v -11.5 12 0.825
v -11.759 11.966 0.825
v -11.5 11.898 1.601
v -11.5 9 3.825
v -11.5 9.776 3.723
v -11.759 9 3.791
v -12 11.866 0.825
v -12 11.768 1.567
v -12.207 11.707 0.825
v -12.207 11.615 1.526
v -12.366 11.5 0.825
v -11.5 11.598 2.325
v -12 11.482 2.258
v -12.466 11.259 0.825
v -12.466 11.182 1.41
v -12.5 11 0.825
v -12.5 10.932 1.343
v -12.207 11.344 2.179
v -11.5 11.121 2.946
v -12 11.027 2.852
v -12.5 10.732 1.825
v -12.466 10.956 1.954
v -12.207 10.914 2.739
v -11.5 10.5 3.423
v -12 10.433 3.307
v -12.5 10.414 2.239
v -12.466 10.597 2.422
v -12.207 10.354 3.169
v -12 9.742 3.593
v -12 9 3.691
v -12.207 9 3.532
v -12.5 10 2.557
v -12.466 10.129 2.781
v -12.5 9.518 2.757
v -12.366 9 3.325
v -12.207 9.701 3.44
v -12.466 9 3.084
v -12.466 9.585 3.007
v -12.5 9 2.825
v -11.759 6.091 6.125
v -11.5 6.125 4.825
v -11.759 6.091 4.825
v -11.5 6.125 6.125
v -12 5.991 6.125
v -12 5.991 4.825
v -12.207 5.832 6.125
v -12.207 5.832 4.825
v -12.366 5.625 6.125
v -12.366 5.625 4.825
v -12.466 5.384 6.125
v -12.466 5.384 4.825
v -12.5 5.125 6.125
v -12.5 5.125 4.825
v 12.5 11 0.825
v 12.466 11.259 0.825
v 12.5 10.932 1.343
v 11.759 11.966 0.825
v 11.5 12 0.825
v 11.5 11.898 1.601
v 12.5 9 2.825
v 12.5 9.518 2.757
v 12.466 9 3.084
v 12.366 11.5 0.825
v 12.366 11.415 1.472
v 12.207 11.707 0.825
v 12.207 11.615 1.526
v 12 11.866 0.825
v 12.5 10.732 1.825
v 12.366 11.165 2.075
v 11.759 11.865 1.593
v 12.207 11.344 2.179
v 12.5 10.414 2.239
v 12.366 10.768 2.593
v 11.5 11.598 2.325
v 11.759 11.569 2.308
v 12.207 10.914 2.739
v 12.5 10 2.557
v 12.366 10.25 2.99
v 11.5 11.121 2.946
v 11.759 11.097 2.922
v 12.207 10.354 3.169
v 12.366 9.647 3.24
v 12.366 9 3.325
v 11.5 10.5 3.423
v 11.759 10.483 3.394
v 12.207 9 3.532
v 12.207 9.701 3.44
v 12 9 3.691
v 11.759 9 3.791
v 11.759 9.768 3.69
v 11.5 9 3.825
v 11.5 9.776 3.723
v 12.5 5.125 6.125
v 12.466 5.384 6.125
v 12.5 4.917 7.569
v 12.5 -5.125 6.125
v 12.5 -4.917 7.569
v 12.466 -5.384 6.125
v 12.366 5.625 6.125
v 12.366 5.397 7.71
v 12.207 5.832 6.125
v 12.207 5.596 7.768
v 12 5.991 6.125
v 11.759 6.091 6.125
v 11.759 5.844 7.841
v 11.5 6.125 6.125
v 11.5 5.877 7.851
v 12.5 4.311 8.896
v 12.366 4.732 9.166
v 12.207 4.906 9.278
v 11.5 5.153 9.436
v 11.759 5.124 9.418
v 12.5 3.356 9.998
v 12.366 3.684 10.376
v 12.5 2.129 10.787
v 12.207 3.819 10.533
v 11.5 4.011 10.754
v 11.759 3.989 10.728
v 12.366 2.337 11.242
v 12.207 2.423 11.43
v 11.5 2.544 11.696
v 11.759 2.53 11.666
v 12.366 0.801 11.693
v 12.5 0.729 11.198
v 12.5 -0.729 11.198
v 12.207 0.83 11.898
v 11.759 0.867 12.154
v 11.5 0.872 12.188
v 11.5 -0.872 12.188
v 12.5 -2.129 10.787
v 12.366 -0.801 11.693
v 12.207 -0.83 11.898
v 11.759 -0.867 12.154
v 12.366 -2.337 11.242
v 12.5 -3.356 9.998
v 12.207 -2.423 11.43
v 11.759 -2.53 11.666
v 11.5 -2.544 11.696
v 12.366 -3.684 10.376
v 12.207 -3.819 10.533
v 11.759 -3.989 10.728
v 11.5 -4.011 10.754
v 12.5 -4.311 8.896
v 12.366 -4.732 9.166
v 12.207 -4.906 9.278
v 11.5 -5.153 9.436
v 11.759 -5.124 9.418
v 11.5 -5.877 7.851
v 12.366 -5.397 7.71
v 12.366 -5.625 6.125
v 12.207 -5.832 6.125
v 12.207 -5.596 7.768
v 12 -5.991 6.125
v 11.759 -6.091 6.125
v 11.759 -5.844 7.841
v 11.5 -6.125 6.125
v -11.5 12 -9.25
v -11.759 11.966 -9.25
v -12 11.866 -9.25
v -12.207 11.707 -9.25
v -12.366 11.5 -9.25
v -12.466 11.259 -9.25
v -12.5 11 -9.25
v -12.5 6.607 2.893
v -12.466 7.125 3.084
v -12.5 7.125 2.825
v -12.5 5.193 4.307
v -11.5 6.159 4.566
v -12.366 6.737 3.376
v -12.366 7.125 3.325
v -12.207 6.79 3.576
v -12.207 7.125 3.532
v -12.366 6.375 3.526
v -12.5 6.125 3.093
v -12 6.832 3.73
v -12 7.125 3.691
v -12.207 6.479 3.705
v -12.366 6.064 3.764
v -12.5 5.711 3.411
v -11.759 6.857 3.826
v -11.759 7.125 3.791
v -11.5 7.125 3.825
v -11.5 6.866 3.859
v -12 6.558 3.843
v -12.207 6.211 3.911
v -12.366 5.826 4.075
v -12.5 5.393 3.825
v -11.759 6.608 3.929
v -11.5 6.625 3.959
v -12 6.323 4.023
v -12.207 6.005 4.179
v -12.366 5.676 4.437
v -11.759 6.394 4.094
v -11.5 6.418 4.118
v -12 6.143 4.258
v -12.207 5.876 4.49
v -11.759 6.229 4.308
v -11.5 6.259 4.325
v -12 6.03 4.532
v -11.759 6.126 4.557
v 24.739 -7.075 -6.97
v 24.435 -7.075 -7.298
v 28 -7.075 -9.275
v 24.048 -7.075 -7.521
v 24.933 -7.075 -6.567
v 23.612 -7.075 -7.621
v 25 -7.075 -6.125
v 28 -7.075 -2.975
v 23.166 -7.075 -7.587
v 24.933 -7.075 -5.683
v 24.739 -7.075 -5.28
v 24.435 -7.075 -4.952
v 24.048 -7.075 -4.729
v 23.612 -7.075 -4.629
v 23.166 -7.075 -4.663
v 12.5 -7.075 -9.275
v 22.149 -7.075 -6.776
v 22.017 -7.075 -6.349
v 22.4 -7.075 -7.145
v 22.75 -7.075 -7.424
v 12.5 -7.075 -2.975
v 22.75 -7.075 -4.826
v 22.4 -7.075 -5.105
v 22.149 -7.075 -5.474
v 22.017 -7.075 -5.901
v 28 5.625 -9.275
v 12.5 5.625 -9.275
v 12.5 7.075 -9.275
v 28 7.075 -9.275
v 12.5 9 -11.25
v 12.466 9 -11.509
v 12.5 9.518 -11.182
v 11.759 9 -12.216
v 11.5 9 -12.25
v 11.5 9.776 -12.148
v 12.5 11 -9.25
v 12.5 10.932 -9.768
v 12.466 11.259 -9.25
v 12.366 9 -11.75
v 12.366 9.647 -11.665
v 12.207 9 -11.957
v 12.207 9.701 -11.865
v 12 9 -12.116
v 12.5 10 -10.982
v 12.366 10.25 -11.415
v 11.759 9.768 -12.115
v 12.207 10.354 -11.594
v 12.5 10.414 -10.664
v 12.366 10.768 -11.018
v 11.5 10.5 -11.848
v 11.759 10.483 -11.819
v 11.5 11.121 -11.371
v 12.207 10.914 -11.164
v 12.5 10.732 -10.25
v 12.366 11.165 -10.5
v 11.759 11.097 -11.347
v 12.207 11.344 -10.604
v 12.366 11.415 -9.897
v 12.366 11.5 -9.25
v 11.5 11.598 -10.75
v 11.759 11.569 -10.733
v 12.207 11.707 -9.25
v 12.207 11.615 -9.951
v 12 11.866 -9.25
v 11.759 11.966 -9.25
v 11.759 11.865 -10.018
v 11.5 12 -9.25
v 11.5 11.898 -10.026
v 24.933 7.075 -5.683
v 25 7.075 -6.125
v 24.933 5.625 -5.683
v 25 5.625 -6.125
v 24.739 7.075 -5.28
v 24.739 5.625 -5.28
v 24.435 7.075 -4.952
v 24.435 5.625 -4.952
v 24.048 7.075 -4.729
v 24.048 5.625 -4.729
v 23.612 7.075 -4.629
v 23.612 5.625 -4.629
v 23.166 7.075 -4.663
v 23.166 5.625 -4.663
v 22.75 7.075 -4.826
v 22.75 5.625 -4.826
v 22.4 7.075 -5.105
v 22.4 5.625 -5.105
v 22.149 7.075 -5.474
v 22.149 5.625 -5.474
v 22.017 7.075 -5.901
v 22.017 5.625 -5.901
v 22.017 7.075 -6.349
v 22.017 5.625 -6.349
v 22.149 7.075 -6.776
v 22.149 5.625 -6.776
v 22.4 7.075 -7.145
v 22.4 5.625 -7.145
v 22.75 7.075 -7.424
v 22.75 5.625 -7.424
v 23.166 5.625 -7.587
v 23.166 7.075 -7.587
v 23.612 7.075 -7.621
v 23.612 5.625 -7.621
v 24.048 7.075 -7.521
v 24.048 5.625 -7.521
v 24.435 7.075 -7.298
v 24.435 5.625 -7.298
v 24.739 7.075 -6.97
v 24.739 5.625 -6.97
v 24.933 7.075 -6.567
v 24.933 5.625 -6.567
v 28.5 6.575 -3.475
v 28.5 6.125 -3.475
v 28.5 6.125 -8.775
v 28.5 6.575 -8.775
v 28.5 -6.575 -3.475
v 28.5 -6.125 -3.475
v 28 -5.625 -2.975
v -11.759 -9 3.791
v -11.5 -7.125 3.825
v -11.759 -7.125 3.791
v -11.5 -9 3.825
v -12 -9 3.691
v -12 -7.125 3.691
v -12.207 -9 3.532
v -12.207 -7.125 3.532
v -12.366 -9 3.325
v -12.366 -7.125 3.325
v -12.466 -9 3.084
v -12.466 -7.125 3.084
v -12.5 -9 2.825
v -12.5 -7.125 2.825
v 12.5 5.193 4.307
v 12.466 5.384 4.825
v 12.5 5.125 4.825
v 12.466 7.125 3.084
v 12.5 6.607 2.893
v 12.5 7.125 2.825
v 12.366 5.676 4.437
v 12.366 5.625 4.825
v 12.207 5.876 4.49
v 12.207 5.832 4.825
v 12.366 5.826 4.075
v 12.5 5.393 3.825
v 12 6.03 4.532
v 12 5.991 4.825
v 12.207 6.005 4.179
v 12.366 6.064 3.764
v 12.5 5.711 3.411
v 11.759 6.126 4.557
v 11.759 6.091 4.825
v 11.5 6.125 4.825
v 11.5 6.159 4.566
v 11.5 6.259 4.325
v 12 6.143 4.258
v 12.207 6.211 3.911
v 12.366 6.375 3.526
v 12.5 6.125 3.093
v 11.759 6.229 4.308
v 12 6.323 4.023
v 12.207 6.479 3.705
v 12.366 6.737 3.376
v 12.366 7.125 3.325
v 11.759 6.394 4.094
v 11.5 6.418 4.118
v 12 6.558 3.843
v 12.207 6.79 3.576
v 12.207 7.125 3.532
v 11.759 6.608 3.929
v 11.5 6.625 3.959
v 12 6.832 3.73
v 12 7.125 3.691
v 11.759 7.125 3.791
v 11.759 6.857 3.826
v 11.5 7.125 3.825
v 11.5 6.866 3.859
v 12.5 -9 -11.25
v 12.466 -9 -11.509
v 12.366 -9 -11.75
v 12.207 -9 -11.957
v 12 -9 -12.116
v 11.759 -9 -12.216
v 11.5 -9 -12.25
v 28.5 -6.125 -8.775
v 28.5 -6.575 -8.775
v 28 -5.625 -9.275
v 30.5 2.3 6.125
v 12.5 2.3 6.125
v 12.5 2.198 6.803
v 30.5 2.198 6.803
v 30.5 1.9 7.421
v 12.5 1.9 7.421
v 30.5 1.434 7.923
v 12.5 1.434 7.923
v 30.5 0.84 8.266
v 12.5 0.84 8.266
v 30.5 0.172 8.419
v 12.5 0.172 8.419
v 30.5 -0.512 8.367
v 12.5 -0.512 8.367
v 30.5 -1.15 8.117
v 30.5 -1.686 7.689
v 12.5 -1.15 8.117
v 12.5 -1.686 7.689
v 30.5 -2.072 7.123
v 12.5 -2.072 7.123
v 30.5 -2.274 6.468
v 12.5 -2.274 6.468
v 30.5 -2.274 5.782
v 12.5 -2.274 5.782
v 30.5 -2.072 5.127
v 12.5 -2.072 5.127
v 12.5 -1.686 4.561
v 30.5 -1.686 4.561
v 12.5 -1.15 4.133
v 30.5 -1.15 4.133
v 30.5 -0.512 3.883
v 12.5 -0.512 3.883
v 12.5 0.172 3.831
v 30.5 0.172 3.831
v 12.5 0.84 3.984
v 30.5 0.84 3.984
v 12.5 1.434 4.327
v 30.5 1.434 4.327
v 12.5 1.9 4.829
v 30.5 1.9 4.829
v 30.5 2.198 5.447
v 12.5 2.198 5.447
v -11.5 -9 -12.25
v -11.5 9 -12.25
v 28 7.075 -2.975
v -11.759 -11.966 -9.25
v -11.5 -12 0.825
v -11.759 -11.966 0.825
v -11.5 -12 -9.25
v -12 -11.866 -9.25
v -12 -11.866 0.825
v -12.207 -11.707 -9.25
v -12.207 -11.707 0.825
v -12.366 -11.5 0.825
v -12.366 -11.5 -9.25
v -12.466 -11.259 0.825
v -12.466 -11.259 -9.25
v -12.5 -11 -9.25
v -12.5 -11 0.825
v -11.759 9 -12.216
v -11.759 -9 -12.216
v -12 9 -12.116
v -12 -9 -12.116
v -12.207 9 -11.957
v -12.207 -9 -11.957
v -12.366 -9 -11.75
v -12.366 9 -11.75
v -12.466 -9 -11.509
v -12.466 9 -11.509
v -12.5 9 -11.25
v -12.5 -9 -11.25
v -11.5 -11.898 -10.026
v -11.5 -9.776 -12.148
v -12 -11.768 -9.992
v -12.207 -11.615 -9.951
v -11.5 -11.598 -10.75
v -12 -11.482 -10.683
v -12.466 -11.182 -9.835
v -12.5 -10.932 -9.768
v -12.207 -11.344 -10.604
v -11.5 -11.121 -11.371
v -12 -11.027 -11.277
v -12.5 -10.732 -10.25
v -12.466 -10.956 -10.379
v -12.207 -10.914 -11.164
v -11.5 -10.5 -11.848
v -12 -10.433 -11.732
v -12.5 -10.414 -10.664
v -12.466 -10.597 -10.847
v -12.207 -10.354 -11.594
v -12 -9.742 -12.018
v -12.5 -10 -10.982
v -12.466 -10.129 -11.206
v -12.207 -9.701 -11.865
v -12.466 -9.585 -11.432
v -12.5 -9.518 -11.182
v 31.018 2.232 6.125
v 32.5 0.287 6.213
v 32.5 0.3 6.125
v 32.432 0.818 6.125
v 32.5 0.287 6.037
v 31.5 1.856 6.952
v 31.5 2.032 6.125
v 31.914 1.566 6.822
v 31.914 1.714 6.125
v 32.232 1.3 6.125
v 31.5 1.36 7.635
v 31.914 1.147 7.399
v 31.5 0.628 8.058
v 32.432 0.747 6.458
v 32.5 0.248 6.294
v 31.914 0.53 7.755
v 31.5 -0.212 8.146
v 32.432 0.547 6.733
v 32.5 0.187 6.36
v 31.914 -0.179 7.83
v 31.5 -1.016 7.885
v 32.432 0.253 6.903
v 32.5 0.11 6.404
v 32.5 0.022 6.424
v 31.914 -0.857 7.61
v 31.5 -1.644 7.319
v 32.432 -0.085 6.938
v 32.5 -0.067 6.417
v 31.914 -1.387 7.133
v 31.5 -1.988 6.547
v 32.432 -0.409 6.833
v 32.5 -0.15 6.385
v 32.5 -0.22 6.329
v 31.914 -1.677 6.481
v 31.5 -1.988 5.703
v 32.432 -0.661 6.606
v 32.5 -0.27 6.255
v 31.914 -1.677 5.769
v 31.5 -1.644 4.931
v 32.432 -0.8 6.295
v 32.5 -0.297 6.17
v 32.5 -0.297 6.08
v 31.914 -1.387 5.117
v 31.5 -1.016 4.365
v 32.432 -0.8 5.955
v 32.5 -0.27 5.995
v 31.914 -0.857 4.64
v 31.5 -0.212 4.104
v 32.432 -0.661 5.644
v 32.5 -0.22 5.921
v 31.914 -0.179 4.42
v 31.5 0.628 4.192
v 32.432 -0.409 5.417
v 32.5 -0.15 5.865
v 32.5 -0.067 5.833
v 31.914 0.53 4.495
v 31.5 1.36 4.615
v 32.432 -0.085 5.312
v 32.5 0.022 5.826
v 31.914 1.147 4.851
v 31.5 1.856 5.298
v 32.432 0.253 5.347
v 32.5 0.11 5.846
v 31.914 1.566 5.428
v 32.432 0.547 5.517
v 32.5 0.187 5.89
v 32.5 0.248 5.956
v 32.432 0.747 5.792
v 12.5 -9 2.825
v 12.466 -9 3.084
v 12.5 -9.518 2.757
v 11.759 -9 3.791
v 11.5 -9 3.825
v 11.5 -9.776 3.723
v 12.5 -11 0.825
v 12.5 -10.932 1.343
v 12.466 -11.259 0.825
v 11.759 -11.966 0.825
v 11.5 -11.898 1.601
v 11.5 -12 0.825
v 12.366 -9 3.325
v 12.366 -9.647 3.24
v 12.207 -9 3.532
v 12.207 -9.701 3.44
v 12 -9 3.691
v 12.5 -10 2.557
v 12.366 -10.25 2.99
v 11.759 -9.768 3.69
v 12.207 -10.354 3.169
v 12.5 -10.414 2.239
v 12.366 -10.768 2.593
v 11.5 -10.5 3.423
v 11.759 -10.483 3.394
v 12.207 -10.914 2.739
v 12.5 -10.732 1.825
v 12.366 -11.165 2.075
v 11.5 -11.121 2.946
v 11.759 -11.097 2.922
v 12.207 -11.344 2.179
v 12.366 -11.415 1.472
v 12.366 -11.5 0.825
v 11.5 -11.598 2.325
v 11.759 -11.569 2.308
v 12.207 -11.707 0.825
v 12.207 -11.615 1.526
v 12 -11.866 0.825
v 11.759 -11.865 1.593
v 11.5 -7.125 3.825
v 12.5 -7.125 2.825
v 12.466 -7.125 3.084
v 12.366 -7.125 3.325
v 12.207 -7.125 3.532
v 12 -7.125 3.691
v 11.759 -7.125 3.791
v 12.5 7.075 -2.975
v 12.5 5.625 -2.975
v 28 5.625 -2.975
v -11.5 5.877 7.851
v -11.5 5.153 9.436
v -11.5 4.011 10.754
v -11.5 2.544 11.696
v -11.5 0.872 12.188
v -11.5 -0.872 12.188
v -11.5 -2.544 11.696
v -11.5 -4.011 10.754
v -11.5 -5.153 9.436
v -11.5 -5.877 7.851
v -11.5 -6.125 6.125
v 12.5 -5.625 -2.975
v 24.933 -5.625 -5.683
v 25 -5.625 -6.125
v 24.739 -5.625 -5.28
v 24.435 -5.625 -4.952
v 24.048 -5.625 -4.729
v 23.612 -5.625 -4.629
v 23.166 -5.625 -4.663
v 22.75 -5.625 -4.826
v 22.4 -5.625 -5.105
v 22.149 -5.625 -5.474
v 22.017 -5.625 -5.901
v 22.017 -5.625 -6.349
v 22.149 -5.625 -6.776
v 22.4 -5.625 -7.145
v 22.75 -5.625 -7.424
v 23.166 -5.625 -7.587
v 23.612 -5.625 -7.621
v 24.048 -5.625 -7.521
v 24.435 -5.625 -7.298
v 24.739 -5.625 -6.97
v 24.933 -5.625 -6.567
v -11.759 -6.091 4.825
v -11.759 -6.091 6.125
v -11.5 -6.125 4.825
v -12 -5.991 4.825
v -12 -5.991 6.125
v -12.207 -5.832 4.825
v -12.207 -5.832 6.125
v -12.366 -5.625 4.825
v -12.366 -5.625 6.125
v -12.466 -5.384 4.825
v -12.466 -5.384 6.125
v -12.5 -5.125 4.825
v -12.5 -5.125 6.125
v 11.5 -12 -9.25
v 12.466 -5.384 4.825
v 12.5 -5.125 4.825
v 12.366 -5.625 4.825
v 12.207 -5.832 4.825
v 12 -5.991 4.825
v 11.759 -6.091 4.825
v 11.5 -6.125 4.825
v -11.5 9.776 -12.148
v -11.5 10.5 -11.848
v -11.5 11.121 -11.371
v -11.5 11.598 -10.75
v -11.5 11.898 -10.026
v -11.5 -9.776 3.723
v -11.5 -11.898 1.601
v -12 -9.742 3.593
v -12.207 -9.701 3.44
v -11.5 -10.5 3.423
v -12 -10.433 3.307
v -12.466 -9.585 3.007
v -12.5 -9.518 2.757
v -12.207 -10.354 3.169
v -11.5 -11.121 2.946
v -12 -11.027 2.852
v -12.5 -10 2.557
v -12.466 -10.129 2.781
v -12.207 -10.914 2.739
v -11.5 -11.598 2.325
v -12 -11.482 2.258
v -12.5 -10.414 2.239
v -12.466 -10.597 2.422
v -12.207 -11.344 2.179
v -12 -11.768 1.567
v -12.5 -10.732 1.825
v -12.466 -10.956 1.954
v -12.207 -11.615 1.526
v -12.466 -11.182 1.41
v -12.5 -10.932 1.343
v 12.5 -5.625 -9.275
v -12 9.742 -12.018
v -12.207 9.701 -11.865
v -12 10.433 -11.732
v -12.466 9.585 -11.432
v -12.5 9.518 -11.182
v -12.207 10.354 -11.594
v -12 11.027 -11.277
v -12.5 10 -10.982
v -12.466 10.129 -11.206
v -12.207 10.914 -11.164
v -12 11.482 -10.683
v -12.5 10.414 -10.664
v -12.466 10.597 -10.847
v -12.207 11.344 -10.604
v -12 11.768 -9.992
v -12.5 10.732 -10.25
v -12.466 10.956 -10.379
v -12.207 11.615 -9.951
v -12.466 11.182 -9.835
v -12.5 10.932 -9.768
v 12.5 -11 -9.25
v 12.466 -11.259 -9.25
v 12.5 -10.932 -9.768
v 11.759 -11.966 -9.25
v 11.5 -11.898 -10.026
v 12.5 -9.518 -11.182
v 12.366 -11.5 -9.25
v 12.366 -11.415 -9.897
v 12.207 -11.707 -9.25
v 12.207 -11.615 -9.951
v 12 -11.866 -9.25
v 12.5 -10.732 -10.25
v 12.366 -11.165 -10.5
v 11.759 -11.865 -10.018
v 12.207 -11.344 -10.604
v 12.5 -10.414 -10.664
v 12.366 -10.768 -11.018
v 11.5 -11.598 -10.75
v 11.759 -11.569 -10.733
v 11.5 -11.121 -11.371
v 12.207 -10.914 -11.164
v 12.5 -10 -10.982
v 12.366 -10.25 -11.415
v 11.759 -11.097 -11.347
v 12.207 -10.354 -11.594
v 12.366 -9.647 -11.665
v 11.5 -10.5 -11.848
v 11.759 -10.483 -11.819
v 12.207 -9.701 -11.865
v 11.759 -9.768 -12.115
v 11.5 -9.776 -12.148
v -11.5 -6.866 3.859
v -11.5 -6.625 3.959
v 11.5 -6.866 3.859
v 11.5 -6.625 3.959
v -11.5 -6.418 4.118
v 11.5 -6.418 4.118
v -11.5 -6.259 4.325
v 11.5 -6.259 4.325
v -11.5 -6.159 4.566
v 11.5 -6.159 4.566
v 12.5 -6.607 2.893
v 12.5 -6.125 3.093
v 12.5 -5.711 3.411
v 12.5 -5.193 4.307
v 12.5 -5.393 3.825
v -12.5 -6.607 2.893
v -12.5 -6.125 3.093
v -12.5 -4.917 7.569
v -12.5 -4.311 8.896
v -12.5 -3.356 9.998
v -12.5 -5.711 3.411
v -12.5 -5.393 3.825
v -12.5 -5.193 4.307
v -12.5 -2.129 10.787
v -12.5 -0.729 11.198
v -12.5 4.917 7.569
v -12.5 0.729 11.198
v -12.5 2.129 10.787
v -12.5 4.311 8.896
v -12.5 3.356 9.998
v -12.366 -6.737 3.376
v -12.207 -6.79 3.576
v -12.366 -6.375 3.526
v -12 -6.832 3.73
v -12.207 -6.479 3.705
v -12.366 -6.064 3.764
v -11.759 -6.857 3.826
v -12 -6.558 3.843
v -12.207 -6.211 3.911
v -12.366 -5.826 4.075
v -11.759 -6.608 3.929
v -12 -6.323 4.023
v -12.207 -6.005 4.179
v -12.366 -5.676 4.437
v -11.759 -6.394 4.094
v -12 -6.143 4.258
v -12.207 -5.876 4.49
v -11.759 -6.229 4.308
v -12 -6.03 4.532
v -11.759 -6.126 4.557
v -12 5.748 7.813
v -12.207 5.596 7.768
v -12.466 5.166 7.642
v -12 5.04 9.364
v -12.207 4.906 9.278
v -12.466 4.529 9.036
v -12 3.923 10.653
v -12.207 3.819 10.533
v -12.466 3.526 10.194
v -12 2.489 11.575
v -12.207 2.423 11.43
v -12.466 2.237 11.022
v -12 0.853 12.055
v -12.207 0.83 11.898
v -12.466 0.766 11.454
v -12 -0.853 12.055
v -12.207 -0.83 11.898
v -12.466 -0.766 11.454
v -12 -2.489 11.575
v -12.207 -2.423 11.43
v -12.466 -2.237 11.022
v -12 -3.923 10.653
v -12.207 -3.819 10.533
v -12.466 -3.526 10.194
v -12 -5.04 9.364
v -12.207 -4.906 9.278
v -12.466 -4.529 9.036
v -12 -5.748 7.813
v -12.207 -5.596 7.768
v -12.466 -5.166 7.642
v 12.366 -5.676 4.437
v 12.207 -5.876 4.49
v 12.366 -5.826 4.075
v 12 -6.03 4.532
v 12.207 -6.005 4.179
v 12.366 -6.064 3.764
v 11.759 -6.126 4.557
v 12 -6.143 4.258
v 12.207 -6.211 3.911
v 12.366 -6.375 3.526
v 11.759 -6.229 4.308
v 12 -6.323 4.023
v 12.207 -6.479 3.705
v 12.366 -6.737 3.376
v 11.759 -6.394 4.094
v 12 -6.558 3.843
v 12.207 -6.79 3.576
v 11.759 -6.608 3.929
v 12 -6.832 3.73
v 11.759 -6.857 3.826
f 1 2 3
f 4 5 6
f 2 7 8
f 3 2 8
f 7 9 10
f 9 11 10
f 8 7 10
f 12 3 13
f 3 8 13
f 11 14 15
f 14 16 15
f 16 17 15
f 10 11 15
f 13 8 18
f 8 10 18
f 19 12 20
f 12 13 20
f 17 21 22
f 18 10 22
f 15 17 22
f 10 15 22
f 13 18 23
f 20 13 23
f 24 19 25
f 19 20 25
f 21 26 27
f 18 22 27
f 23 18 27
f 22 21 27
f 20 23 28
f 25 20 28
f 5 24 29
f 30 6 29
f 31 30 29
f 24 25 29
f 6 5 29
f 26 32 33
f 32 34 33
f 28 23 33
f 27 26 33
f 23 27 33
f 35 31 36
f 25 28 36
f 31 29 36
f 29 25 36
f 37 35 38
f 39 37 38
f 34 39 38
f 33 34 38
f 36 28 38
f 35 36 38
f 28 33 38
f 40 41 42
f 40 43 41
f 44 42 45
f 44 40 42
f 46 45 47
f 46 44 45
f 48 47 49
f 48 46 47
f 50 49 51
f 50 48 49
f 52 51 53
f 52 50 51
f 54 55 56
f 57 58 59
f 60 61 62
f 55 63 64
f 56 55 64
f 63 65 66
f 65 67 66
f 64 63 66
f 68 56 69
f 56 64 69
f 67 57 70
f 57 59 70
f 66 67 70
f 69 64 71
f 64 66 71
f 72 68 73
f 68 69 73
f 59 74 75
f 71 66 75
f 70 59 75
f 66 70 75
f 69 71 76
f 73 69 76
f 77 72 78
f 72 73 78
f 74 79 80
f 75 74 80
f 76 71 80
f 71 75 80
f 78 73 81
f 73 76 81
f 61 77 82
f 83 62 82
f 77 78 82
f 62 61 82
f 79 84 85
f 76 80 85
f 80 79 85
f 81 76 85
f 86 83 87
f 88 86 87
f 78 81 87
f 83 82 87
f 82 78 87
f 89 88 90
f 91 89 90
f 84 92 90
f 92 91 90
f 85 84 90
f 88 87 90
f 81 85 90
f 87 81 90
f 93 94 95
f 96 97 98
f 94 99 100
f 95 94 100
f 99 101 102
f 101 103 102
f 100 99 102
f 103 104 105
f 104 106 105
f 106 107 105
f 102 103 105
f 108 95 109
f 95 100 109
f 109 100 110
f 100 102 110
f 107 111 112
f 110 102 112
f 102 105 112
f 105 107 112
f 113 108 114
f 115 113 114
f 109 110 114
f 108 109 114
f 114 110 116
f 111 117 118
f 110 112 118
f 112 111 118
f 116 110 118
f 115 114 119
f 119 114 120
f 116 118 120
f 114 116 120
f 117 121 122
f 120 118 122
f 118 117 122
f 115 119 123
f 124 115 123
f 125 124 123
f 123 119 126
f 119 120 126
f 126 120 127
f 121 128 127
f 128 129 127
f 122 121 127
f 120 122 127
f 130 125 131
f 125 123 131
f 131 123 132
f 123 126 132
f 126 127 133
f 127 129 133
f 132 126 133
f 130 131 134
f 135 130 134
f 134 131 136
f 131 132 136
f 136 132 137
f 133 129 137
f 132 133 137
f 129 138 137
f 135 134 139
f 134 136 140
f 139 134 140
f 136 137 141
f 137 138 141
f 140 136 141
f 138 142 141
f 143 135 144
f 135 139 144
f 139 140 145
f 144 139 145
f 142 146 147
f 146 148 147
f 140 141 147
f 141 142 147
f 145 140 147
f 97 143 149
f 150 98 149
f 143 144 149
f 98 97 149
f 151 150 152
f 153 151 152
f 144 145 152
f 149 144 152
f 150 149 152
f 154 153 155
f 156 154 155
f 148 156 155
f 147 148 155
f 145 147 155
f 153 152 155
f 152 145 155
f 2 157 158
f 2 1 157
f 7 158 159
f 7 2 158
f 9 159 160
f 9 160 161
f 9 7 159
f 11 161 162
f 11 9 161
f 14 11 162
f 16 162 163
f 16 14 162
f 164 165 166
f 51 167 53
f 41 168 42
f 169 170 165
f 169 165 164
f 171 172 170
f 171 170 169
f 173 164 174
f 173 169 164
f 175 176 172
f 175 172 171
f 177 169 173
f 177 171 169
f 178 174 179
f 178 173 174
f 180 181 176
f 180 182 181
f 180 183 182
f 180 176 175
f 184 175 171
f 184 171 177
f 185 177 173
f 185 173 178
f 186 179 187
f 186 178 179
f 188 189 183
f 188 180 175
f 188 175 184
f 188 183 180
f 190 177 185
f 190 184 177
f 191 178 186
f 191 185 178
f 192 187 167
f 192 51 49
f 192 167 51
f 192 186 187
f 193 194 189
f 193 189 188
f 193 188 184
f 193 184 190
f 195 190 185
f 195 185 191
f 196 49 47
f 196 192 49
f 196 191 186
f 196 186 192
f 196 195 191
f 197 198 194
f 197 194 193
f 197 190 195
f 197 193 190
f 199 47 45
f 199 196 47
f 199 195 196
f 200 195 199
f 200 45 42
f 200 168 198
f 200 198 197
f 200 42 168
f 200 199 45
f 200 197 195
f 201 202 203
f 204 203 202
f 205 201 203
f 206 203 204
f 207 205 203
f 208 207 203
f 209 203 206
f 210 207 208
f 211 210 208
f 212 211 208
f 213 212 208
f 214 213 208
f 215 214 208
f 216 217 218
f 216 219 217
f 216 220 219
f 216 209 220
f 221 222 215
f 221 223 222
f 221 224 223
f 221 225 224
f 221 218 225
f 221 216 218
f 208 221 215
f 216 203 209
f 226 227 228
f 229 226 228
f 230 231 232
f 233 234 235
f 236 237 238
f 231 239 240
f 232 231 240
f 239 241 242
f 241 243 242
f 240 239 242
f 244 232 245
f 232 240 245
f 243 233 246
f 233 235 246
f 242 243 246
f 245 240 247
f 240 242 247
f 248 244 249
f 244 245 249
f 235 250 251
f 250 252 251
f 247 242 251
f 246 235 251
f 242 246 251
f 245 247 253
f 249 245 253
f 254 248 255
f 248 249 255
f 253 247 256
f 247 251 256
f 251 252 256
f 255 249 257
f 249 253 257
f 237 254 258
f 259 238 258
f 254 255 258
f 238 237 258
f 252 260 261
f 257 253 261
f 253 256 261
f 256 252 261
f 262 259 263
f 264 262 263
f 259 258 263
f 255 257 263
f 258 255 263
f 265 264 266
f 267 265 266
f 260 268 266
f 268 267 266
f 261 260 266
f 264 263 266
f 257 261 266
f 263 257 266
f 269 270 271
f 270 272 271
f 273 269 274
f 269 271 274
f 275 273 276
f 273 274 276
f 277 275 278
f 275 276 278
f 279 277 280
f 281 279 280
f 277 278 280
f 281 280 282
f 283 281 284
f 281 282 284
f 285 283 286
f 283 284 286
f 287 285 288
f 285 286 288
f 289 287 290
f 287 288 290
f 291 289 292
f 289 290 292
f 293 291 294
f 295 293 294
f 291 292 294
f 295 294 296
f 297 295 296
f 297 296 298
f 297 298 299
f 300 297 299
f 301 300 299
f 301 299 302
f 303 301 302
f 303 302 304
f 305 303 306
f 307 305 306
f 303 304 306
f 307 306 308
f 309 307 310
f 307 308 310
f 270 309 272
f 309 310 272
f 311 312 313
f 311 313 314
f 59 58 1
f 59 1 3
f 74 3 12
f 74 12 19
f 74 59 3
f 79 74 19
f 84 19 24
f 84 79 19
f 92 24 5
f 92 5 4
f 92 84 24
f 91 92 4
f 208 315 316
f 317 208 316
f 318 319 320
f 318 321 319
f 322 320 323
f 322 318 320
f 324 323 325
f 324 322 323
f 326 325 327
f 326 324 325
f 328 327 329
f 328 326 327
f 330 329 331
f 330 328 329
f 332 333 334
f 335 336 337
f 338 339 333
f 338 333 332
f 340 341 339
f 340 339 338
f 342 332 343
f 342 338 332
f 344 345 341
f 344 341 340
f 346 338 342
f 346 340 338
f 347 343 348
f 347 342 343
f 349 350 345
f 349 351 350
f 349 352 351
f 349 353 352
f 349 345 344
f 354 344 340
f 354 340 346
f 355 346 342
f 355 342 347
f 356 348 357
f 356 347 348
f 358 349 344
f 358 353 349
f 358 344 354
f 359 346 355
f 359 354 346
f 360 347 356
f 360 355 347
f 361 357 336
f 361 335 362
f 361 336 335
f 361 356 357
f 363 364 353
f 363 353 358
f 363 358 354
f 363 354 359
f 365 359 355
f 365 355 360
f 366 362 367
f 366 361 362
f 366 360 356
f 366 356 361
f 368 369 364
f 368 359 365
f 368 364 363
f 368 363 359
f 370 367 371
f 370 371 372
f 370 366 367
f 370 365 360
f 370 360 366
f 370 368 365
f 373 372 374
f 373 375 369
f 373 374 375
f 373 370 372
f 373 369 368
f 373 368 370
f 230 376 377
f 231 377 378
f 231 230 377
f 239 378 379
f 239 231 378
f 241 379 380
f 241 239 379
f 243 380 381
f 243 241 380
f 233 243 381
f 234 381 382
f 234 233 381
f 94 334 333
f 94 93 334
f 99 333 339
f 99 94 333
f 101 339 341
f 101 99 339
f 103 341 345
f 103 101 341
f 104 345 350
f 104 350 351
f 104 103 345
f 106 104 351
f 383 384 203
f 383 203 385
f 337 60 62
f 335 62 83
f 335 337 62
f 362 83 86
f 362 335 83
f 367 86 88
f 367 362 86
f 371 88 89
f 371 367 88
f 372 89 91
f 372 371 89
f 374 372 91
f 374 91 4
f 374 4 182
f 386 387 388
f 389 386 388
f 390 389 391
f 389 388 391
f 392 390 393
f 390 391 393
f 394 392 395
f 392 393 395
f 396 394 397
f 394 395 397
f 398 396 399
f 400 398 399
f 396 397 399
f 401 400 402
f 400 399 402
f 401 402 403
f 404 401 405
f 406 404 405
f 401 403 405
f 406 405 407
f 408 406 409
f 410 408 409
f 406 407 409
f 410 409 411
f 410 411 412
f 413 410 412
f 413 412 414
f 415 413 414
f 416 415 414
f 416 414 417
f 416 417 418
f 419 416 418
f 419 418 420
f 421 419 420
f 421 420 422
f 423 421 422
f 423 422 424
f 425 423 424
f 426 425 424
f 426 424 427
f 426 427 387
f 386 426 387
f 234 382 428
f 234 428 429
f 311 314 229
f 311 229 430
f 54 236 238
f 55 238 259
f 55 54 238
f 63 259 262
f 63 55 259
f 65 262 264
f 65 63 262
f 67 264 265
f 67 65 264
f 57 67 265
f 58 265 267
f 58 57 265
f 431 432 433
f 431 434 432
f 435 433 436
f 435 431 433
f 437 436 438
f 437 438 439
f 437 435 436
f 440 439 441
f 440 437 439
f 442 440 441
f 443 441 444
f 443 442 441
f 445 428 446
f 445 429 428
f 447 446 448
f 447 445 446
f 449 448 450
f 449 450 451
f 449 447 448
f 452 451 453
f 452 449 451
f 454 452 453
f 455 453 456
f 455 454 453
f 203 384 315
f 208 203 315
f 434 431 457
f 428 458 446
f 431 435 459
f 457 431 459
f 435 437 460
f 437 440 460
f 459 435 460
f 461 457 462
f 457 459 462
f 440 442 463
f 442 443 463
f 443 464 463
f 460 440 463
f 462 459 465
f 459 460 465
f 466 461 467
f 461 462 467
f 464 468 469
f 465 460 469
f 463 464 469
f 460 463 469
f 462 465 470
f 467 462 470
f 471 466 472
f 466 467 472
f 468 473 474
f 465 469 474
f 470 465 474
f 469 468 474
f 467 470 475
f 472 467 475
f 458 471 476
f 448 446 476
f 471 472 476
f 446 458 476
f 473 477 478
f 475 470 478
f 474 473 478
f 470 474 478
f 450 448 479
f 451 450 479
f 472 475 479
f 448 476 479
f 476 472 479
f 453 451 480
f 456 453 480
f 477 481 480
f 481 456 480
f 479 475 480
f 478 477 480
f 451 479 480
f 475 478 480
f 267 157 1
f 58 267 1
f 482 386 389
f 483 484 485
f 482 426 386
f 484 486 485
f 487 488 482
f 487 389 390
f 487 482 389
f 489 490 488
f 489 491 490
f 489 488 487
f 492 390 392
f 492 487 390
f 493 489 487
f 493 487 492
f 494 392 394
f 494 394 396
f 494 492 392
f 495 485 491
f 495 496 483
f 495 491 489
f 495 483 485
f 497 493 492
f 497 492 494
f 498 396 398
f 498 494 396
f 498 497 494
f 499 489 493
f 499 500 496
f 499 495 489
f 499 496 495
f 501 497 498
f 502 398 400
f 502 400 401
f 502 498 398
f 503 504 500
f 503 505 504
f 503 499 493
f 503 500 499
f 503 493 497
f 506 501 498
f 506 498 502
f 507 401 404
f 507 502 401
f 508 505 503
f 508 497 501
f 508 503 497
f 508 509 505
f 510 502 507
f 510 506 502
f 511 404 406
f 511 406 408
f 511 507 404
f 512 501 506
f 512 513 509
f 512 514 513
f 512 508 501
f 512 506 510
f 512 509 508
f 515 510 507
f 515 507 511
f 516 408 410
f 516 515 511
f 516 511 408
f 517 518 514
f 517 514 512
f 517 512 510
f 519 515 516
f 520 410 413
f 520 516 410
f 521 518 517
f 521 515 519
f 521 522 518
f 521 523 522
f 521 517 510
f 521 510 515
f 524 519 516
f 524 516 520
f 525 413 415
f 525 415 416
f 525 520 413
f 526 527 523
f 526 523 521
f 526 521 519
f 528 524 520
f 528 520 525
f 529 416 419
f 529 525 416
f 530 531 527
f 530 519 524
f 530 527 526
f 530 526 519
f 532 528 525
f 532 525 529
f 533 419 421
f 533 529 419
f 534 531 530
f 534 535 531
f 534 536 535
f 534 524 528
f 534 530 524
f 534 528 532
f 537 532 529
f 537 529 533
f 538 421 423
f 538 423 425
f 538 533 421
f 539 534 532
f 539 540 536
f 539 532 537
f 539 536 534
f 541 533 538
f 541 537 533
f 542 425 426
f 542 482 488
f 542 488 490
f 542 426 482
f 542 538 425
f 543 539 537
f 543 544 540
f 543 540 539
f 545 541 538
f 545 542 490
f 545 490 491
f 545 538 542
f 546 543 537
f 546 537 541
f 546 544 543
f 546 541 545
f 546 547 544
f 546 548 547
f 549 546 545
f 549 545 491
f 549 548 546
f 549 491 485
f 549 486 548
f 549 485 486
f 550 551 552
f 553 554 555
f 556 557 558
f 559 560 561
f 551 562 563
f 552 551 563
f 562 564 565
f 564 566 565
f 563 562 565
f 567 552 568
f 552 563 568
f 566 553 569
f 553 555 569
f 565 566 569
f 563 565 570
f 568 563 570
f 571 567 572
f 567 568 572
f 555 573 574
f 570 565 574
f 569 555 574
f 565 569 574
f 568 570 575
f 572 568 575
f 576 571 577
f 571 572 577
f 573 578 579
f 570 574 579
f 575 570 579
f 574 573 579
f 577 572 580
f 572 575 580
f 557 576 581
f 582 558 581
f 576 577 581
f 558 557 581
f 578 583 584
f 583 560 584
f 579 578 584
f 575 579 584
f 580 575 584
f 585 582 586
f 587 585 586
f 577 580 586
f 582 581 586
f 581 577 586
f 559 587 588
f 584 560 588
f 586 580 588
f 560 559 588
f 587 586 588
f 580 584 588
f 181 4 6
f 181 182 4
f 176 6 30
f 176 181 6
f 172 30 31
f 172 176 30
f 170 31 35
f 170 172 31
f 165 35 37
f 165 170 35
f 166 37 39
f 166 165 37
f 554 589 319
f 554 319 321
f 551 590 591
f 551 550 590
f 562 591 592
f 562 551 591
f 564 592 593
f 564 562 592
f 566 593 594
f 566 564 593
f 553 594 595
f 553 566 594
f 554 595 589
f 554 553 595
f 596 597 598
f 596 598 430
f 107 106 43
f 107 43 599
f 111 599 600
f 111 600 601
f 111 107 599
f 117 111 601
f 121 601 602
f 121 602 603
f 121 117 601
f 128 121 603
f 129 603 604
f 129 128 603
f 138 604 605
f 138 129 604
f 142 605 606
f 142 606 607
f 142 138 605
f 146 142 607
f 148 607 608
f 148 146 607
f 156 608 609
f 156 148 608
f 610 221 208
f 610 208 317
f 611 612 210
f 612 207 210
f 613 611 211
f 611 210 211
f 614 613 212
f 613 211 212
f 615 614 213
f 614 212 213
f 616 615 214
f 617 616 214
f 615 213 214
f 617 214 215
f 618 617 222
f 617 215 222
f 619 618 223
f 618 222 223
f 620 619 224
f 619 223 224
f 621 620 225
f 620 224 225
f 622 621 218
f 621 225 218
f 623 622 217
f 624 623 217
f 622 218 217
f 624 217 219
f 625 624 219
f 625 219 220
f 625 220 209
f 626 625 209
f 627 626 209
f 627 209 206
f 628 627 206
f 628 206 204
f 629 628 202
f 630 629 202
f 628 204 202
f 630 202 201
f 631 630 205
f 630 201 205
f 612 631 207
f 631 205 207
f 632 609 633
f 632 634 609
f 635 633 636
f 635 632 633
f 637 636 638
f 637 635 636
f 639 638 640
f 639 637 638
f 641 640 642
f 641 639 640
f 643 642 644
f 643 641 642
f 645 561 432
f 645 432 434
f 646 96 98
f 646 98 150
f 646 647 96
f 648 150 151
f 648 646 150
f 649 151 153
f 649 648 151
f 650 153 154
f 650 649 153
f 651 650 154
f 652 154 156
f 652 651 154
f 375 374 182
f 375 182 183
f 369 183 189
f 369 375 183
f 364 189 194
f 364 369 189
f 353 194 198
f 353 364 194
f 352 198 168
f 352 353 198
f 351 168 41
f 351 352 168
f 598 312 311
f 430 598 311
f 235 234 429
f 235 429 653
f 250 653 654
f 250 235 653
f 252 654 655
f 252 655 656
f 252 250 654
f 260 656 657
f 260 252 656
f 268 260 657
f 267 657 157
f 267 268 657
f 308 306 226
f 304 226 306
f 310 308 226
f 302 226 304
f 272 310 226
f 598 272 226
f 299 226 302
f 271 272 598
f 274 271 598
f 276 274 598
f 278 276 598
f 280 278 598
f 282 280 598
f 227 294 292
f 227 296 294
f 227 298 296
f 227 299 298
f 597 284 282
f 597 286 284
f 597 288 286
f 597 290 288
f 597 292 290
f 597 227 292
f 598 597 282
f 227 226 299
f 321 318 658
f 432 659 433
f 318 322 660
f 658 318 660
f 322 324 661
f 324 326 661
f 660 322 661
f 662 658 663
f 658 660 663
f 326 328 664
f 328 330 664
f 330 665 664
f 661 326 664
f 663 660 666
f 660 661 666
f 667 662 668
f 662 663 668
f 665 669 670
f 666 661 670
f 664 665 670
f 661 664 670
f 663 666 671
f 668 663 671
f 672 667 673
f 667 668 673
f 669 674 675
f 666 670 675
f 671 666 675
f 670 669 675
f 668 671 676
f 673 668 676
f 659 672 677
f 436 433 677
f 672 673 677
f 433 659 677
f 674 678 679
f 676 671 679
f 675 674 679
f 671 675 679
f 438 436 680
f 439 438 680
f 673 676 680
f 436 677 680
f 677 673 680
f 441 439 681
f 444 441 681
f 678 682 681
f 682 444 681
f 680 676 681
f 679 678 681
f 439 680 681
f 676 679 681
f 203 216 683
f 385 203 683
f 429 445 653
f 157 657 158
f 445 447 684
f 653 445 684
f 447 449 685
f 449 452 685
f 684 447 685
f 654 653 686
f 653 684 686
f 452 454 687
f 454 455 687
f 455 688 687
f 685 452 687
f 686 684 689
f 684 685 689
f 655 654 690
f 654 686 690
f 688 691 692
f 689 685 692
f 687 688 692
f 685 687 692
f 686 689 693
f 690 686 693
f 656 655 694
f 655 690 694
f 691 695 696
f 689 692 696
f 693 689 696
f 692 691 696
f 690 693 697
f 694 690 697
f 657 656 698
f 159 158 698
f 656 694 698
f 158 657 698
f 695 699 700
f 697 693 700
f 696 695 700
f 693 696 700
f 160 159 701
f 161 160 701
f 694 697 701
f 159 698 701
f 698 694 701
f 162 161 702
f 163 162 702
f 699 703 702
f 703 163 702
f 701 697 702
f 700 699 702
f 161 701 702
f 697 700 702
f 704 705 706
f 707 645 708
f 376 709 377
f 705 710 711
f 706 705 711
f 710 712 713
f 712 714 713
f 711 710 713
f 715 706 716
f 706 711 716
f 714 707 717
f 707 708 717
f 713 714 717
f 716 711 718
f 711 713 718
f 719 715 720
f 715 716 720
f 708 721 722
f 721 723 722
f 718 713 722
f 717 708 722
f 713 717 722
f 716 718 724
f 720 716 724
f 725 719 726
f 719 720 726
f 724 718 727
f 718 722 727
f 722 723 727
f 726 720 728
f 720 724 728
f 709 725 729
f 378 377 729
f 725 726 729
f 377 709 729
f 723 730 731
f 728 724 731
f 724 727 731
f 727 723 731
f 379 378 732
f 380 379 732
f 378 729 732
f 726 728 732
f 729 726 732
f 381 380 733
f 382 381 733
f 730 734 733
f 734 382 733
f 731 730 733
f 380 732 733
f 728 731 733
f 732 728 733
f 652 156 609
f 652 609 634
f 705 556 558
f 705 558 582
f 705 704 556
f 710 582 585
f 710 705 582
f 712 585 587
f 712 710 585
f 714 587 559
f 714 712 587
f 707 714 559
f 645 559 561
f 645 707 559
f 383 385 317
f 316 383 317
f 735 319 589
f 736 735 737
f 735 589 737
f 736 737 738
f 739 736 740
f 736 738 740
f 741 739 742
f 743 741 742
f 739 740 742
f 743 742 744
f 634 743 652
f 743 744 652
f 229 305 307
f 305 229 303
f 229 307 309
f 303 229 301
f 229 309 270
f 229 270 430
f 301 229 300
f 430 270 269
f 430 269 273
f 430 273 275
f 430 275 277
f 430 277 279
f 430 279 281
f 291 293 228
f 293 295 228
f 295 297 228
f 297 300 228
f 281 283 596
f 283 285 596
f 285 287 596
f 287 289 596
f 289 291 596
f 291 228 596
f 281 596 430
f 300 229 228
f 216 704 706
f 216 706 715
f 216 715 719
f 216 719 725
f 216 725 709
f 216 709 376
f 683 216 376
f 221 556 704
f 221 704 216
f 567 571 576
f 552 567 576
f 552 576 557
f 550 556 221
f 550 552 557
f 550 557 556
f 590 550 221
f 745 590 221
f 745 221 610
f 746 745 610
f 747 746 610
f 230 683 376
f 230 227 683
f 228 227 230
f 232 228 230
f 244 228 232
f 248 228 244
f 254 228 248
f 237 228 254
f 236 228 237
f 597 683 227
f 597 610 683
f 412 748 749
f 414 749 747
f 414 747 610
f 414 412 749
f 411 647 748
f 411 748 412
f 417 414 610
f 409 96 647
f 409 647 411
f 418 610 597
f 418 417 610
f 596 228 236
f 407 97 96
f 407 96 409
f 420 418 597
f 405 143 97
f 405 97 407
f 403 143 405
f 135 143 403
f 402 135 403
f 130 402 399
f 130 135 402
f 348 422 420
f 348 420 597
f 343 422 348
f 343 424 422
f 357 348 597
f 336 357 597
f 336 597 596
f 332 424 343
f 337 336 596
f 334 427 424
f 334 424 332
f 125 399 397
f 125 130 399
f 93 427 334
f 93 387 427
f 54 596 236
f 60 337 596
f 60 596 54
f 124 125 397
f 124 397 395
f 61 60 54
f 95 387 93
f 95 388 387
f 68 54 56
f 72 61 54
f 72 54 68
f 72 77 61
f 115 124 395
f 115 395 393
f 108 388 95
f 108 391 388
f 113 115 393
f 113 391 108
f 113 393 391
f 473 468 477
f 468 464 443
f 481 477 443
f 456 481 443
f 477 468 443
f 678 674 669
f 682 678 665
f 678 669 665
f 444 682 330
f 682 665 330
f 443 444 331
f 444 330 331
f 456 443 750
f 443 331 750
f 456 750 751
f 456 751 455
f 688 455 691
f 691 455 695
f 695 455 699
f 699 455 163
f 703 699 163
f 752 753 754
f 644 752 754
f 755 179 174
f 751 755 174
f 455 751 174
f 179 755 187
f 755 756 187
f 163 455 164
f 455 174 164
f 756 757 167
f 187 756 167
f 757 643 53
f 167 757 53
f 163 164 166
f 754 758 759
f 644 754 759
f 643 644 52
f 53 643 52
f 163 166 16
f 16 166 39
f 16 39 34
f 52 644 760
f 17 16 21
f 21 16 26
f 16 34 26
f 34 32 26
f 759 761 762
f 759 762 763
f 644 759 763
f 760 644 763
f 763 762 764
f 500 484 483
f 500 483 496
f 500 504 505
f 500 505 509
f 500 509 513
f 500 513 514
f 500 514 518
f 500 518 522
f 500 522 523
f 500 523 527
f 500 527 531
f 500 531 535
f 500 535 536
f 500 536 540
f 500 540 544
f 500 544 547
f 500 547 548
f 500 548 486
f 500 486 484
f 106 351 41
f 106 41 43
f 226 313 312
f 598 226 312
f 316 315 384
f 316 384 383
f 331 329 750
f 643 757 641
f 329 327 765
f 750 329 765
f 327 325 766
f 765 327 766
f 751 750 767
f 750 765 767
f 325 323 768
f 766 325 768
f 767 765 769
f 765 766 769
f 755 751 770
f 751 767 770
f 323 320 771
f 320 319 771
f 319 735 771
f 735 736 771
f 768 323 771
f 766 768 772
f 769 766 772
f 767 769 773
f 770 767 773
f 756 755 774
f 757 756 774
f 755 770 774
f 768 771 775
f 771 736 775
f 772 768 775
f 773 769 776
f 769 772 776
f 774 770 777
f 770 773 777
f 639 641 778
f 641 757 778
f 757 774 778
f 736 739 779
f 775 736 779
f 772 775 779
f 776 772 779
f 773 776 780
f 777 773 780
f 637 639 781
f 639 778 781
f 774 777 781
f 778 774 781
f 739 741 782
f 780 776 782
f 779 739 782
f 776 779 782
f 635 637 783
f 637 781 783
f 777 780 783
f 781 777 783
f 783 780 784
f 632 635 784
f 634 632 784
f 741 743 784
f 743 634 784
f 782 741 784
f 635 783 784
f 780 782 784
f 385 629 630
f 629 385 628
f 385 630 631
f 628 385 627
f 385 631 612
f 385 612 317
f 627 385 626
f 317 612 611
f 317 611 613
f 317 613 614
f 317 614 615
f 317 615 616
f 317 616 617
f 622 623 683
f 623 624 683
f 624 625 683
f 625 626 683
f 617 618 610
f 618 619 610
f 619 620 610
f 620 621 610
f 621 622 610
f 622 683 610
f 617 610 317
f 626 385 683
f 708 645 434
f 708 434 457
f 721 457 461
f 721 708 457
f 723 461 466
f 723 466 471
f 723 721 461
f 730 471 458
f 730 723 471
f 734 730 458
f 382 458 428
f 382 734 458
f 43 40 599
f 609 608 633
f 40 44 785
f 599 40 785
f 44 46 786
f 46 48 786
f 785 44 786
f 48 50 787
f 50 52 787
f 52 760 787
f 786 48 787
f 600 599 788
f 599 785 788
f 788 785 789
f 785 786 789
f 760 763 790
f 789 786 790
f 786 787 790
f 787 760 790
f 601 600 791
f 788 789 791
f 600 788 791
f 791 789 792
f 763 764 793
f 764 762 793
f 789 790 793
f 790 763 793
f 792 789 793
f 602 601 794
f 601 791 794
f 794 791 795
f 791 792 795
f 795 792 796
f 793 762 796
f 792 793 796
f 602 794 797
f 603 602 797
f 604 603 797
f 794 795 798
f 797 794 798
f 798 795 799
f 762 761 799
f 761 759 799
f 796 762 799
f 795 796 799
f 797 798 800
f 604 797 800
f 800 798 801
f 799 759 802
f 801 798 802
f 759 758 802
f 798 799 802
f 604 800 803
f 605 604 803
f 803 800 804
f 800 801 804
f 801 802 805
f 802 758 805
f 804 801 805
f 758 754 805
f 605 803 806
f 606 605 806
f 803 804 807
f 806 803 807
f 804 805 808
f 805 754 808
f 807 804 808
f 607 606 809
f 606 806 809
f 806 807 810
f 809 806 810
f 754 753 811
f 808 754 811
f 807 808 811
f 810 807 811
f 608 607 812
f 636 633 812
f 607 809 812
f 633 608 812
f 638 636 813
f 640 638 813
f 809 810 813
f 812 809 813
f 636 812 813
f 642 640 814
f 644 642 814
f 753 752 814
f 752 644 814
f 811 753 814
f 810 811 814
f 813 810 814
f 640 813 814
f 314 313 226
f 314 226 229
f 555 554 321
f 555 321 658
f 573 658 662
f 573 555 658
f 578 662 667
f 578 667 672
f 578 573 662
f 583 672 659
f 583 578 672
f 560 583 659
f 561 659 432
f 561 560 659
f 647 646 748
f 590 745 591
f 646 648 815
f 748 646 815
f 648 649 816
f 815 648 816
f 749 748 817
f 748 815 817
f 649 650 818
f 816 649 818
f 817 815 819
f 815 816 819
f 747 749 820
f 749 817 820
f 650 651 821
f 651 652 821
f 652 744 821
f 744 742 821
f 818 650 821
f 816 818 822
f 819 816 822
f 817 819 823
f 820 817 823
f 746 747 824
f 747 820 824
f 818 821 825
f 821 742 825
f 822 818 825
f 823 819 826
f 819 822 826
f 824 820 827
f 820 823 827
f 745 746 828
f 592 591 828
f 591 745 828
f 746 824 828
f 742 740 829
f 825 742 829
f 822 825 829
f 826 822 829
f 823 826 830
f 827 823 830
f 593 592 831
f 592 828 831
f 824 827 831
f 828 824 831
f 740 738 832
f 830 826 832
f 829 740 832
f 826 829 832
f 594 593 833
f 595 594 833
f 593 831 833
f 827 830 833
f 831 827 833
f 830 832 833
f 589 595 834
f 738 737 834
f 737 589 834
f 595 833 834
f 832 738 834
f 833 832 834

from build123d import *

# Parameters (mm, degrees)
F1_DEPTH = 12.5
F2_W     = 1.45
F2_H     = 6.3
F2_R     = 2.3
F3_DEPTH = 28.5
F4_R     = 1.5
F5_DEPTH = 12.5
F6_SIZE  = 0.5
F7_R     = 2.3
F8_DEPTH = 4
F9_R     = 2
F10_R    = 1


with BuildPart() as f1:
    # F0 (on Right) → F1 (new body, symmetric)
    with BuildSketch(Plane.YZ):
        with BuildLine():
            Line((-9, -12.25), (9, -12.25))
            ThreePointArc((9, -12.25), (11.12132, -11.37132), (12, -9.25))
            Line((12, -9.25), (12, 0.825))
            ThreePointArc((12, 0.825), (11.12132, 2.94632), (9, 3.825))
            Line((9, 3.825), (6.125, 3.825))
            Line((6.125, 3.825), (6.125, 6.125))
            ThreePointArc((6.125, 6.125), (0, 12.25), (-6.125, 6.125))
            Line((-6.125, 6.125), (-6.125, 3.825))
            Line((-6.125, 3.825), (-9, 3.825))
            ThreePointArc((-9, 3.825), (-11.12132, 2.94632), (-12, 0.825))
            Line((-12, 0.825), (-12, -9.25))
            ThreePointArc((-12, -9.25), (-11.12132, -11.37132), (-9, -12.25))
        make_face()
    extrude(amount=F1_DEPTH, both=True)

    # F2 (on Right) → F3 (join)
    with BuildSketch(Plane.YZ):
        with Locations((-6.35, -6.125)):
            Rectangle(F2_W, F2_H)
        with Locations((6.35, -6.125)):
            Rectangle(F2_W, F2_H)
        with Locations((0, 6.125)):
            Circle(F2_R)
    extrude(amount=F3_DEPTH)

    # F4 (on Front) → F5 (cut, symmetric)
    with BuildSketch(Plane.XZ):
        with Locations((23.5, -6.125)):
            Circle(F4_R)
    extrude(amount=F5_DEPTH, both=True, mode=Mode.SUBTRACT)

    # F6
    f6_edges = [f1.edges().sort_by_distance(p)[0] for p in [
        (28.5, -7.075, -6.125),
        (28.5, -6.35, -9.275),
        (28.5, -5.625, -6.125),
        (28.5, -6.35, -2.975),
        (28.5, 5.625, -6.125),
        (28.5, 6.35, -9.275),
        (28.5, 7.075, -6.125),
        (28.5, 6.35, -2.975),
    ]]
    chamfer(f6_edges, length=F6_SIZE)

    # F7 (on face) → F8 (join)
    with BuildSketch(Plane.YZ.offset(28.5)):
        with Locations((0, 6.125)):
            Circle(F7_R)
    extrude(amount=F8_DEPTH)

    # F9
    f9_edges = [f1.edges().sort_by_distance(p)[0] for p in [
        (32.5, -2.3, 6.125),
    ]]
    fillet(f9_edges, radius=F9_R)

    # F10
    f10_edges = [f1.edges().sort_by_distance(p)[0] for p in [
        (12.5, 0, 12.25),
        (12.5, 7.5625, 3.825),
        (-12.5, 11.12132, -11.37132),
        (-12.5, 0, 12.25),
        (0, -6.125, 3.825),
        (0, 6.125, 3.825),
    ]]
    fillet(f10_edges, radius=F10_R)


solid = f1.part
